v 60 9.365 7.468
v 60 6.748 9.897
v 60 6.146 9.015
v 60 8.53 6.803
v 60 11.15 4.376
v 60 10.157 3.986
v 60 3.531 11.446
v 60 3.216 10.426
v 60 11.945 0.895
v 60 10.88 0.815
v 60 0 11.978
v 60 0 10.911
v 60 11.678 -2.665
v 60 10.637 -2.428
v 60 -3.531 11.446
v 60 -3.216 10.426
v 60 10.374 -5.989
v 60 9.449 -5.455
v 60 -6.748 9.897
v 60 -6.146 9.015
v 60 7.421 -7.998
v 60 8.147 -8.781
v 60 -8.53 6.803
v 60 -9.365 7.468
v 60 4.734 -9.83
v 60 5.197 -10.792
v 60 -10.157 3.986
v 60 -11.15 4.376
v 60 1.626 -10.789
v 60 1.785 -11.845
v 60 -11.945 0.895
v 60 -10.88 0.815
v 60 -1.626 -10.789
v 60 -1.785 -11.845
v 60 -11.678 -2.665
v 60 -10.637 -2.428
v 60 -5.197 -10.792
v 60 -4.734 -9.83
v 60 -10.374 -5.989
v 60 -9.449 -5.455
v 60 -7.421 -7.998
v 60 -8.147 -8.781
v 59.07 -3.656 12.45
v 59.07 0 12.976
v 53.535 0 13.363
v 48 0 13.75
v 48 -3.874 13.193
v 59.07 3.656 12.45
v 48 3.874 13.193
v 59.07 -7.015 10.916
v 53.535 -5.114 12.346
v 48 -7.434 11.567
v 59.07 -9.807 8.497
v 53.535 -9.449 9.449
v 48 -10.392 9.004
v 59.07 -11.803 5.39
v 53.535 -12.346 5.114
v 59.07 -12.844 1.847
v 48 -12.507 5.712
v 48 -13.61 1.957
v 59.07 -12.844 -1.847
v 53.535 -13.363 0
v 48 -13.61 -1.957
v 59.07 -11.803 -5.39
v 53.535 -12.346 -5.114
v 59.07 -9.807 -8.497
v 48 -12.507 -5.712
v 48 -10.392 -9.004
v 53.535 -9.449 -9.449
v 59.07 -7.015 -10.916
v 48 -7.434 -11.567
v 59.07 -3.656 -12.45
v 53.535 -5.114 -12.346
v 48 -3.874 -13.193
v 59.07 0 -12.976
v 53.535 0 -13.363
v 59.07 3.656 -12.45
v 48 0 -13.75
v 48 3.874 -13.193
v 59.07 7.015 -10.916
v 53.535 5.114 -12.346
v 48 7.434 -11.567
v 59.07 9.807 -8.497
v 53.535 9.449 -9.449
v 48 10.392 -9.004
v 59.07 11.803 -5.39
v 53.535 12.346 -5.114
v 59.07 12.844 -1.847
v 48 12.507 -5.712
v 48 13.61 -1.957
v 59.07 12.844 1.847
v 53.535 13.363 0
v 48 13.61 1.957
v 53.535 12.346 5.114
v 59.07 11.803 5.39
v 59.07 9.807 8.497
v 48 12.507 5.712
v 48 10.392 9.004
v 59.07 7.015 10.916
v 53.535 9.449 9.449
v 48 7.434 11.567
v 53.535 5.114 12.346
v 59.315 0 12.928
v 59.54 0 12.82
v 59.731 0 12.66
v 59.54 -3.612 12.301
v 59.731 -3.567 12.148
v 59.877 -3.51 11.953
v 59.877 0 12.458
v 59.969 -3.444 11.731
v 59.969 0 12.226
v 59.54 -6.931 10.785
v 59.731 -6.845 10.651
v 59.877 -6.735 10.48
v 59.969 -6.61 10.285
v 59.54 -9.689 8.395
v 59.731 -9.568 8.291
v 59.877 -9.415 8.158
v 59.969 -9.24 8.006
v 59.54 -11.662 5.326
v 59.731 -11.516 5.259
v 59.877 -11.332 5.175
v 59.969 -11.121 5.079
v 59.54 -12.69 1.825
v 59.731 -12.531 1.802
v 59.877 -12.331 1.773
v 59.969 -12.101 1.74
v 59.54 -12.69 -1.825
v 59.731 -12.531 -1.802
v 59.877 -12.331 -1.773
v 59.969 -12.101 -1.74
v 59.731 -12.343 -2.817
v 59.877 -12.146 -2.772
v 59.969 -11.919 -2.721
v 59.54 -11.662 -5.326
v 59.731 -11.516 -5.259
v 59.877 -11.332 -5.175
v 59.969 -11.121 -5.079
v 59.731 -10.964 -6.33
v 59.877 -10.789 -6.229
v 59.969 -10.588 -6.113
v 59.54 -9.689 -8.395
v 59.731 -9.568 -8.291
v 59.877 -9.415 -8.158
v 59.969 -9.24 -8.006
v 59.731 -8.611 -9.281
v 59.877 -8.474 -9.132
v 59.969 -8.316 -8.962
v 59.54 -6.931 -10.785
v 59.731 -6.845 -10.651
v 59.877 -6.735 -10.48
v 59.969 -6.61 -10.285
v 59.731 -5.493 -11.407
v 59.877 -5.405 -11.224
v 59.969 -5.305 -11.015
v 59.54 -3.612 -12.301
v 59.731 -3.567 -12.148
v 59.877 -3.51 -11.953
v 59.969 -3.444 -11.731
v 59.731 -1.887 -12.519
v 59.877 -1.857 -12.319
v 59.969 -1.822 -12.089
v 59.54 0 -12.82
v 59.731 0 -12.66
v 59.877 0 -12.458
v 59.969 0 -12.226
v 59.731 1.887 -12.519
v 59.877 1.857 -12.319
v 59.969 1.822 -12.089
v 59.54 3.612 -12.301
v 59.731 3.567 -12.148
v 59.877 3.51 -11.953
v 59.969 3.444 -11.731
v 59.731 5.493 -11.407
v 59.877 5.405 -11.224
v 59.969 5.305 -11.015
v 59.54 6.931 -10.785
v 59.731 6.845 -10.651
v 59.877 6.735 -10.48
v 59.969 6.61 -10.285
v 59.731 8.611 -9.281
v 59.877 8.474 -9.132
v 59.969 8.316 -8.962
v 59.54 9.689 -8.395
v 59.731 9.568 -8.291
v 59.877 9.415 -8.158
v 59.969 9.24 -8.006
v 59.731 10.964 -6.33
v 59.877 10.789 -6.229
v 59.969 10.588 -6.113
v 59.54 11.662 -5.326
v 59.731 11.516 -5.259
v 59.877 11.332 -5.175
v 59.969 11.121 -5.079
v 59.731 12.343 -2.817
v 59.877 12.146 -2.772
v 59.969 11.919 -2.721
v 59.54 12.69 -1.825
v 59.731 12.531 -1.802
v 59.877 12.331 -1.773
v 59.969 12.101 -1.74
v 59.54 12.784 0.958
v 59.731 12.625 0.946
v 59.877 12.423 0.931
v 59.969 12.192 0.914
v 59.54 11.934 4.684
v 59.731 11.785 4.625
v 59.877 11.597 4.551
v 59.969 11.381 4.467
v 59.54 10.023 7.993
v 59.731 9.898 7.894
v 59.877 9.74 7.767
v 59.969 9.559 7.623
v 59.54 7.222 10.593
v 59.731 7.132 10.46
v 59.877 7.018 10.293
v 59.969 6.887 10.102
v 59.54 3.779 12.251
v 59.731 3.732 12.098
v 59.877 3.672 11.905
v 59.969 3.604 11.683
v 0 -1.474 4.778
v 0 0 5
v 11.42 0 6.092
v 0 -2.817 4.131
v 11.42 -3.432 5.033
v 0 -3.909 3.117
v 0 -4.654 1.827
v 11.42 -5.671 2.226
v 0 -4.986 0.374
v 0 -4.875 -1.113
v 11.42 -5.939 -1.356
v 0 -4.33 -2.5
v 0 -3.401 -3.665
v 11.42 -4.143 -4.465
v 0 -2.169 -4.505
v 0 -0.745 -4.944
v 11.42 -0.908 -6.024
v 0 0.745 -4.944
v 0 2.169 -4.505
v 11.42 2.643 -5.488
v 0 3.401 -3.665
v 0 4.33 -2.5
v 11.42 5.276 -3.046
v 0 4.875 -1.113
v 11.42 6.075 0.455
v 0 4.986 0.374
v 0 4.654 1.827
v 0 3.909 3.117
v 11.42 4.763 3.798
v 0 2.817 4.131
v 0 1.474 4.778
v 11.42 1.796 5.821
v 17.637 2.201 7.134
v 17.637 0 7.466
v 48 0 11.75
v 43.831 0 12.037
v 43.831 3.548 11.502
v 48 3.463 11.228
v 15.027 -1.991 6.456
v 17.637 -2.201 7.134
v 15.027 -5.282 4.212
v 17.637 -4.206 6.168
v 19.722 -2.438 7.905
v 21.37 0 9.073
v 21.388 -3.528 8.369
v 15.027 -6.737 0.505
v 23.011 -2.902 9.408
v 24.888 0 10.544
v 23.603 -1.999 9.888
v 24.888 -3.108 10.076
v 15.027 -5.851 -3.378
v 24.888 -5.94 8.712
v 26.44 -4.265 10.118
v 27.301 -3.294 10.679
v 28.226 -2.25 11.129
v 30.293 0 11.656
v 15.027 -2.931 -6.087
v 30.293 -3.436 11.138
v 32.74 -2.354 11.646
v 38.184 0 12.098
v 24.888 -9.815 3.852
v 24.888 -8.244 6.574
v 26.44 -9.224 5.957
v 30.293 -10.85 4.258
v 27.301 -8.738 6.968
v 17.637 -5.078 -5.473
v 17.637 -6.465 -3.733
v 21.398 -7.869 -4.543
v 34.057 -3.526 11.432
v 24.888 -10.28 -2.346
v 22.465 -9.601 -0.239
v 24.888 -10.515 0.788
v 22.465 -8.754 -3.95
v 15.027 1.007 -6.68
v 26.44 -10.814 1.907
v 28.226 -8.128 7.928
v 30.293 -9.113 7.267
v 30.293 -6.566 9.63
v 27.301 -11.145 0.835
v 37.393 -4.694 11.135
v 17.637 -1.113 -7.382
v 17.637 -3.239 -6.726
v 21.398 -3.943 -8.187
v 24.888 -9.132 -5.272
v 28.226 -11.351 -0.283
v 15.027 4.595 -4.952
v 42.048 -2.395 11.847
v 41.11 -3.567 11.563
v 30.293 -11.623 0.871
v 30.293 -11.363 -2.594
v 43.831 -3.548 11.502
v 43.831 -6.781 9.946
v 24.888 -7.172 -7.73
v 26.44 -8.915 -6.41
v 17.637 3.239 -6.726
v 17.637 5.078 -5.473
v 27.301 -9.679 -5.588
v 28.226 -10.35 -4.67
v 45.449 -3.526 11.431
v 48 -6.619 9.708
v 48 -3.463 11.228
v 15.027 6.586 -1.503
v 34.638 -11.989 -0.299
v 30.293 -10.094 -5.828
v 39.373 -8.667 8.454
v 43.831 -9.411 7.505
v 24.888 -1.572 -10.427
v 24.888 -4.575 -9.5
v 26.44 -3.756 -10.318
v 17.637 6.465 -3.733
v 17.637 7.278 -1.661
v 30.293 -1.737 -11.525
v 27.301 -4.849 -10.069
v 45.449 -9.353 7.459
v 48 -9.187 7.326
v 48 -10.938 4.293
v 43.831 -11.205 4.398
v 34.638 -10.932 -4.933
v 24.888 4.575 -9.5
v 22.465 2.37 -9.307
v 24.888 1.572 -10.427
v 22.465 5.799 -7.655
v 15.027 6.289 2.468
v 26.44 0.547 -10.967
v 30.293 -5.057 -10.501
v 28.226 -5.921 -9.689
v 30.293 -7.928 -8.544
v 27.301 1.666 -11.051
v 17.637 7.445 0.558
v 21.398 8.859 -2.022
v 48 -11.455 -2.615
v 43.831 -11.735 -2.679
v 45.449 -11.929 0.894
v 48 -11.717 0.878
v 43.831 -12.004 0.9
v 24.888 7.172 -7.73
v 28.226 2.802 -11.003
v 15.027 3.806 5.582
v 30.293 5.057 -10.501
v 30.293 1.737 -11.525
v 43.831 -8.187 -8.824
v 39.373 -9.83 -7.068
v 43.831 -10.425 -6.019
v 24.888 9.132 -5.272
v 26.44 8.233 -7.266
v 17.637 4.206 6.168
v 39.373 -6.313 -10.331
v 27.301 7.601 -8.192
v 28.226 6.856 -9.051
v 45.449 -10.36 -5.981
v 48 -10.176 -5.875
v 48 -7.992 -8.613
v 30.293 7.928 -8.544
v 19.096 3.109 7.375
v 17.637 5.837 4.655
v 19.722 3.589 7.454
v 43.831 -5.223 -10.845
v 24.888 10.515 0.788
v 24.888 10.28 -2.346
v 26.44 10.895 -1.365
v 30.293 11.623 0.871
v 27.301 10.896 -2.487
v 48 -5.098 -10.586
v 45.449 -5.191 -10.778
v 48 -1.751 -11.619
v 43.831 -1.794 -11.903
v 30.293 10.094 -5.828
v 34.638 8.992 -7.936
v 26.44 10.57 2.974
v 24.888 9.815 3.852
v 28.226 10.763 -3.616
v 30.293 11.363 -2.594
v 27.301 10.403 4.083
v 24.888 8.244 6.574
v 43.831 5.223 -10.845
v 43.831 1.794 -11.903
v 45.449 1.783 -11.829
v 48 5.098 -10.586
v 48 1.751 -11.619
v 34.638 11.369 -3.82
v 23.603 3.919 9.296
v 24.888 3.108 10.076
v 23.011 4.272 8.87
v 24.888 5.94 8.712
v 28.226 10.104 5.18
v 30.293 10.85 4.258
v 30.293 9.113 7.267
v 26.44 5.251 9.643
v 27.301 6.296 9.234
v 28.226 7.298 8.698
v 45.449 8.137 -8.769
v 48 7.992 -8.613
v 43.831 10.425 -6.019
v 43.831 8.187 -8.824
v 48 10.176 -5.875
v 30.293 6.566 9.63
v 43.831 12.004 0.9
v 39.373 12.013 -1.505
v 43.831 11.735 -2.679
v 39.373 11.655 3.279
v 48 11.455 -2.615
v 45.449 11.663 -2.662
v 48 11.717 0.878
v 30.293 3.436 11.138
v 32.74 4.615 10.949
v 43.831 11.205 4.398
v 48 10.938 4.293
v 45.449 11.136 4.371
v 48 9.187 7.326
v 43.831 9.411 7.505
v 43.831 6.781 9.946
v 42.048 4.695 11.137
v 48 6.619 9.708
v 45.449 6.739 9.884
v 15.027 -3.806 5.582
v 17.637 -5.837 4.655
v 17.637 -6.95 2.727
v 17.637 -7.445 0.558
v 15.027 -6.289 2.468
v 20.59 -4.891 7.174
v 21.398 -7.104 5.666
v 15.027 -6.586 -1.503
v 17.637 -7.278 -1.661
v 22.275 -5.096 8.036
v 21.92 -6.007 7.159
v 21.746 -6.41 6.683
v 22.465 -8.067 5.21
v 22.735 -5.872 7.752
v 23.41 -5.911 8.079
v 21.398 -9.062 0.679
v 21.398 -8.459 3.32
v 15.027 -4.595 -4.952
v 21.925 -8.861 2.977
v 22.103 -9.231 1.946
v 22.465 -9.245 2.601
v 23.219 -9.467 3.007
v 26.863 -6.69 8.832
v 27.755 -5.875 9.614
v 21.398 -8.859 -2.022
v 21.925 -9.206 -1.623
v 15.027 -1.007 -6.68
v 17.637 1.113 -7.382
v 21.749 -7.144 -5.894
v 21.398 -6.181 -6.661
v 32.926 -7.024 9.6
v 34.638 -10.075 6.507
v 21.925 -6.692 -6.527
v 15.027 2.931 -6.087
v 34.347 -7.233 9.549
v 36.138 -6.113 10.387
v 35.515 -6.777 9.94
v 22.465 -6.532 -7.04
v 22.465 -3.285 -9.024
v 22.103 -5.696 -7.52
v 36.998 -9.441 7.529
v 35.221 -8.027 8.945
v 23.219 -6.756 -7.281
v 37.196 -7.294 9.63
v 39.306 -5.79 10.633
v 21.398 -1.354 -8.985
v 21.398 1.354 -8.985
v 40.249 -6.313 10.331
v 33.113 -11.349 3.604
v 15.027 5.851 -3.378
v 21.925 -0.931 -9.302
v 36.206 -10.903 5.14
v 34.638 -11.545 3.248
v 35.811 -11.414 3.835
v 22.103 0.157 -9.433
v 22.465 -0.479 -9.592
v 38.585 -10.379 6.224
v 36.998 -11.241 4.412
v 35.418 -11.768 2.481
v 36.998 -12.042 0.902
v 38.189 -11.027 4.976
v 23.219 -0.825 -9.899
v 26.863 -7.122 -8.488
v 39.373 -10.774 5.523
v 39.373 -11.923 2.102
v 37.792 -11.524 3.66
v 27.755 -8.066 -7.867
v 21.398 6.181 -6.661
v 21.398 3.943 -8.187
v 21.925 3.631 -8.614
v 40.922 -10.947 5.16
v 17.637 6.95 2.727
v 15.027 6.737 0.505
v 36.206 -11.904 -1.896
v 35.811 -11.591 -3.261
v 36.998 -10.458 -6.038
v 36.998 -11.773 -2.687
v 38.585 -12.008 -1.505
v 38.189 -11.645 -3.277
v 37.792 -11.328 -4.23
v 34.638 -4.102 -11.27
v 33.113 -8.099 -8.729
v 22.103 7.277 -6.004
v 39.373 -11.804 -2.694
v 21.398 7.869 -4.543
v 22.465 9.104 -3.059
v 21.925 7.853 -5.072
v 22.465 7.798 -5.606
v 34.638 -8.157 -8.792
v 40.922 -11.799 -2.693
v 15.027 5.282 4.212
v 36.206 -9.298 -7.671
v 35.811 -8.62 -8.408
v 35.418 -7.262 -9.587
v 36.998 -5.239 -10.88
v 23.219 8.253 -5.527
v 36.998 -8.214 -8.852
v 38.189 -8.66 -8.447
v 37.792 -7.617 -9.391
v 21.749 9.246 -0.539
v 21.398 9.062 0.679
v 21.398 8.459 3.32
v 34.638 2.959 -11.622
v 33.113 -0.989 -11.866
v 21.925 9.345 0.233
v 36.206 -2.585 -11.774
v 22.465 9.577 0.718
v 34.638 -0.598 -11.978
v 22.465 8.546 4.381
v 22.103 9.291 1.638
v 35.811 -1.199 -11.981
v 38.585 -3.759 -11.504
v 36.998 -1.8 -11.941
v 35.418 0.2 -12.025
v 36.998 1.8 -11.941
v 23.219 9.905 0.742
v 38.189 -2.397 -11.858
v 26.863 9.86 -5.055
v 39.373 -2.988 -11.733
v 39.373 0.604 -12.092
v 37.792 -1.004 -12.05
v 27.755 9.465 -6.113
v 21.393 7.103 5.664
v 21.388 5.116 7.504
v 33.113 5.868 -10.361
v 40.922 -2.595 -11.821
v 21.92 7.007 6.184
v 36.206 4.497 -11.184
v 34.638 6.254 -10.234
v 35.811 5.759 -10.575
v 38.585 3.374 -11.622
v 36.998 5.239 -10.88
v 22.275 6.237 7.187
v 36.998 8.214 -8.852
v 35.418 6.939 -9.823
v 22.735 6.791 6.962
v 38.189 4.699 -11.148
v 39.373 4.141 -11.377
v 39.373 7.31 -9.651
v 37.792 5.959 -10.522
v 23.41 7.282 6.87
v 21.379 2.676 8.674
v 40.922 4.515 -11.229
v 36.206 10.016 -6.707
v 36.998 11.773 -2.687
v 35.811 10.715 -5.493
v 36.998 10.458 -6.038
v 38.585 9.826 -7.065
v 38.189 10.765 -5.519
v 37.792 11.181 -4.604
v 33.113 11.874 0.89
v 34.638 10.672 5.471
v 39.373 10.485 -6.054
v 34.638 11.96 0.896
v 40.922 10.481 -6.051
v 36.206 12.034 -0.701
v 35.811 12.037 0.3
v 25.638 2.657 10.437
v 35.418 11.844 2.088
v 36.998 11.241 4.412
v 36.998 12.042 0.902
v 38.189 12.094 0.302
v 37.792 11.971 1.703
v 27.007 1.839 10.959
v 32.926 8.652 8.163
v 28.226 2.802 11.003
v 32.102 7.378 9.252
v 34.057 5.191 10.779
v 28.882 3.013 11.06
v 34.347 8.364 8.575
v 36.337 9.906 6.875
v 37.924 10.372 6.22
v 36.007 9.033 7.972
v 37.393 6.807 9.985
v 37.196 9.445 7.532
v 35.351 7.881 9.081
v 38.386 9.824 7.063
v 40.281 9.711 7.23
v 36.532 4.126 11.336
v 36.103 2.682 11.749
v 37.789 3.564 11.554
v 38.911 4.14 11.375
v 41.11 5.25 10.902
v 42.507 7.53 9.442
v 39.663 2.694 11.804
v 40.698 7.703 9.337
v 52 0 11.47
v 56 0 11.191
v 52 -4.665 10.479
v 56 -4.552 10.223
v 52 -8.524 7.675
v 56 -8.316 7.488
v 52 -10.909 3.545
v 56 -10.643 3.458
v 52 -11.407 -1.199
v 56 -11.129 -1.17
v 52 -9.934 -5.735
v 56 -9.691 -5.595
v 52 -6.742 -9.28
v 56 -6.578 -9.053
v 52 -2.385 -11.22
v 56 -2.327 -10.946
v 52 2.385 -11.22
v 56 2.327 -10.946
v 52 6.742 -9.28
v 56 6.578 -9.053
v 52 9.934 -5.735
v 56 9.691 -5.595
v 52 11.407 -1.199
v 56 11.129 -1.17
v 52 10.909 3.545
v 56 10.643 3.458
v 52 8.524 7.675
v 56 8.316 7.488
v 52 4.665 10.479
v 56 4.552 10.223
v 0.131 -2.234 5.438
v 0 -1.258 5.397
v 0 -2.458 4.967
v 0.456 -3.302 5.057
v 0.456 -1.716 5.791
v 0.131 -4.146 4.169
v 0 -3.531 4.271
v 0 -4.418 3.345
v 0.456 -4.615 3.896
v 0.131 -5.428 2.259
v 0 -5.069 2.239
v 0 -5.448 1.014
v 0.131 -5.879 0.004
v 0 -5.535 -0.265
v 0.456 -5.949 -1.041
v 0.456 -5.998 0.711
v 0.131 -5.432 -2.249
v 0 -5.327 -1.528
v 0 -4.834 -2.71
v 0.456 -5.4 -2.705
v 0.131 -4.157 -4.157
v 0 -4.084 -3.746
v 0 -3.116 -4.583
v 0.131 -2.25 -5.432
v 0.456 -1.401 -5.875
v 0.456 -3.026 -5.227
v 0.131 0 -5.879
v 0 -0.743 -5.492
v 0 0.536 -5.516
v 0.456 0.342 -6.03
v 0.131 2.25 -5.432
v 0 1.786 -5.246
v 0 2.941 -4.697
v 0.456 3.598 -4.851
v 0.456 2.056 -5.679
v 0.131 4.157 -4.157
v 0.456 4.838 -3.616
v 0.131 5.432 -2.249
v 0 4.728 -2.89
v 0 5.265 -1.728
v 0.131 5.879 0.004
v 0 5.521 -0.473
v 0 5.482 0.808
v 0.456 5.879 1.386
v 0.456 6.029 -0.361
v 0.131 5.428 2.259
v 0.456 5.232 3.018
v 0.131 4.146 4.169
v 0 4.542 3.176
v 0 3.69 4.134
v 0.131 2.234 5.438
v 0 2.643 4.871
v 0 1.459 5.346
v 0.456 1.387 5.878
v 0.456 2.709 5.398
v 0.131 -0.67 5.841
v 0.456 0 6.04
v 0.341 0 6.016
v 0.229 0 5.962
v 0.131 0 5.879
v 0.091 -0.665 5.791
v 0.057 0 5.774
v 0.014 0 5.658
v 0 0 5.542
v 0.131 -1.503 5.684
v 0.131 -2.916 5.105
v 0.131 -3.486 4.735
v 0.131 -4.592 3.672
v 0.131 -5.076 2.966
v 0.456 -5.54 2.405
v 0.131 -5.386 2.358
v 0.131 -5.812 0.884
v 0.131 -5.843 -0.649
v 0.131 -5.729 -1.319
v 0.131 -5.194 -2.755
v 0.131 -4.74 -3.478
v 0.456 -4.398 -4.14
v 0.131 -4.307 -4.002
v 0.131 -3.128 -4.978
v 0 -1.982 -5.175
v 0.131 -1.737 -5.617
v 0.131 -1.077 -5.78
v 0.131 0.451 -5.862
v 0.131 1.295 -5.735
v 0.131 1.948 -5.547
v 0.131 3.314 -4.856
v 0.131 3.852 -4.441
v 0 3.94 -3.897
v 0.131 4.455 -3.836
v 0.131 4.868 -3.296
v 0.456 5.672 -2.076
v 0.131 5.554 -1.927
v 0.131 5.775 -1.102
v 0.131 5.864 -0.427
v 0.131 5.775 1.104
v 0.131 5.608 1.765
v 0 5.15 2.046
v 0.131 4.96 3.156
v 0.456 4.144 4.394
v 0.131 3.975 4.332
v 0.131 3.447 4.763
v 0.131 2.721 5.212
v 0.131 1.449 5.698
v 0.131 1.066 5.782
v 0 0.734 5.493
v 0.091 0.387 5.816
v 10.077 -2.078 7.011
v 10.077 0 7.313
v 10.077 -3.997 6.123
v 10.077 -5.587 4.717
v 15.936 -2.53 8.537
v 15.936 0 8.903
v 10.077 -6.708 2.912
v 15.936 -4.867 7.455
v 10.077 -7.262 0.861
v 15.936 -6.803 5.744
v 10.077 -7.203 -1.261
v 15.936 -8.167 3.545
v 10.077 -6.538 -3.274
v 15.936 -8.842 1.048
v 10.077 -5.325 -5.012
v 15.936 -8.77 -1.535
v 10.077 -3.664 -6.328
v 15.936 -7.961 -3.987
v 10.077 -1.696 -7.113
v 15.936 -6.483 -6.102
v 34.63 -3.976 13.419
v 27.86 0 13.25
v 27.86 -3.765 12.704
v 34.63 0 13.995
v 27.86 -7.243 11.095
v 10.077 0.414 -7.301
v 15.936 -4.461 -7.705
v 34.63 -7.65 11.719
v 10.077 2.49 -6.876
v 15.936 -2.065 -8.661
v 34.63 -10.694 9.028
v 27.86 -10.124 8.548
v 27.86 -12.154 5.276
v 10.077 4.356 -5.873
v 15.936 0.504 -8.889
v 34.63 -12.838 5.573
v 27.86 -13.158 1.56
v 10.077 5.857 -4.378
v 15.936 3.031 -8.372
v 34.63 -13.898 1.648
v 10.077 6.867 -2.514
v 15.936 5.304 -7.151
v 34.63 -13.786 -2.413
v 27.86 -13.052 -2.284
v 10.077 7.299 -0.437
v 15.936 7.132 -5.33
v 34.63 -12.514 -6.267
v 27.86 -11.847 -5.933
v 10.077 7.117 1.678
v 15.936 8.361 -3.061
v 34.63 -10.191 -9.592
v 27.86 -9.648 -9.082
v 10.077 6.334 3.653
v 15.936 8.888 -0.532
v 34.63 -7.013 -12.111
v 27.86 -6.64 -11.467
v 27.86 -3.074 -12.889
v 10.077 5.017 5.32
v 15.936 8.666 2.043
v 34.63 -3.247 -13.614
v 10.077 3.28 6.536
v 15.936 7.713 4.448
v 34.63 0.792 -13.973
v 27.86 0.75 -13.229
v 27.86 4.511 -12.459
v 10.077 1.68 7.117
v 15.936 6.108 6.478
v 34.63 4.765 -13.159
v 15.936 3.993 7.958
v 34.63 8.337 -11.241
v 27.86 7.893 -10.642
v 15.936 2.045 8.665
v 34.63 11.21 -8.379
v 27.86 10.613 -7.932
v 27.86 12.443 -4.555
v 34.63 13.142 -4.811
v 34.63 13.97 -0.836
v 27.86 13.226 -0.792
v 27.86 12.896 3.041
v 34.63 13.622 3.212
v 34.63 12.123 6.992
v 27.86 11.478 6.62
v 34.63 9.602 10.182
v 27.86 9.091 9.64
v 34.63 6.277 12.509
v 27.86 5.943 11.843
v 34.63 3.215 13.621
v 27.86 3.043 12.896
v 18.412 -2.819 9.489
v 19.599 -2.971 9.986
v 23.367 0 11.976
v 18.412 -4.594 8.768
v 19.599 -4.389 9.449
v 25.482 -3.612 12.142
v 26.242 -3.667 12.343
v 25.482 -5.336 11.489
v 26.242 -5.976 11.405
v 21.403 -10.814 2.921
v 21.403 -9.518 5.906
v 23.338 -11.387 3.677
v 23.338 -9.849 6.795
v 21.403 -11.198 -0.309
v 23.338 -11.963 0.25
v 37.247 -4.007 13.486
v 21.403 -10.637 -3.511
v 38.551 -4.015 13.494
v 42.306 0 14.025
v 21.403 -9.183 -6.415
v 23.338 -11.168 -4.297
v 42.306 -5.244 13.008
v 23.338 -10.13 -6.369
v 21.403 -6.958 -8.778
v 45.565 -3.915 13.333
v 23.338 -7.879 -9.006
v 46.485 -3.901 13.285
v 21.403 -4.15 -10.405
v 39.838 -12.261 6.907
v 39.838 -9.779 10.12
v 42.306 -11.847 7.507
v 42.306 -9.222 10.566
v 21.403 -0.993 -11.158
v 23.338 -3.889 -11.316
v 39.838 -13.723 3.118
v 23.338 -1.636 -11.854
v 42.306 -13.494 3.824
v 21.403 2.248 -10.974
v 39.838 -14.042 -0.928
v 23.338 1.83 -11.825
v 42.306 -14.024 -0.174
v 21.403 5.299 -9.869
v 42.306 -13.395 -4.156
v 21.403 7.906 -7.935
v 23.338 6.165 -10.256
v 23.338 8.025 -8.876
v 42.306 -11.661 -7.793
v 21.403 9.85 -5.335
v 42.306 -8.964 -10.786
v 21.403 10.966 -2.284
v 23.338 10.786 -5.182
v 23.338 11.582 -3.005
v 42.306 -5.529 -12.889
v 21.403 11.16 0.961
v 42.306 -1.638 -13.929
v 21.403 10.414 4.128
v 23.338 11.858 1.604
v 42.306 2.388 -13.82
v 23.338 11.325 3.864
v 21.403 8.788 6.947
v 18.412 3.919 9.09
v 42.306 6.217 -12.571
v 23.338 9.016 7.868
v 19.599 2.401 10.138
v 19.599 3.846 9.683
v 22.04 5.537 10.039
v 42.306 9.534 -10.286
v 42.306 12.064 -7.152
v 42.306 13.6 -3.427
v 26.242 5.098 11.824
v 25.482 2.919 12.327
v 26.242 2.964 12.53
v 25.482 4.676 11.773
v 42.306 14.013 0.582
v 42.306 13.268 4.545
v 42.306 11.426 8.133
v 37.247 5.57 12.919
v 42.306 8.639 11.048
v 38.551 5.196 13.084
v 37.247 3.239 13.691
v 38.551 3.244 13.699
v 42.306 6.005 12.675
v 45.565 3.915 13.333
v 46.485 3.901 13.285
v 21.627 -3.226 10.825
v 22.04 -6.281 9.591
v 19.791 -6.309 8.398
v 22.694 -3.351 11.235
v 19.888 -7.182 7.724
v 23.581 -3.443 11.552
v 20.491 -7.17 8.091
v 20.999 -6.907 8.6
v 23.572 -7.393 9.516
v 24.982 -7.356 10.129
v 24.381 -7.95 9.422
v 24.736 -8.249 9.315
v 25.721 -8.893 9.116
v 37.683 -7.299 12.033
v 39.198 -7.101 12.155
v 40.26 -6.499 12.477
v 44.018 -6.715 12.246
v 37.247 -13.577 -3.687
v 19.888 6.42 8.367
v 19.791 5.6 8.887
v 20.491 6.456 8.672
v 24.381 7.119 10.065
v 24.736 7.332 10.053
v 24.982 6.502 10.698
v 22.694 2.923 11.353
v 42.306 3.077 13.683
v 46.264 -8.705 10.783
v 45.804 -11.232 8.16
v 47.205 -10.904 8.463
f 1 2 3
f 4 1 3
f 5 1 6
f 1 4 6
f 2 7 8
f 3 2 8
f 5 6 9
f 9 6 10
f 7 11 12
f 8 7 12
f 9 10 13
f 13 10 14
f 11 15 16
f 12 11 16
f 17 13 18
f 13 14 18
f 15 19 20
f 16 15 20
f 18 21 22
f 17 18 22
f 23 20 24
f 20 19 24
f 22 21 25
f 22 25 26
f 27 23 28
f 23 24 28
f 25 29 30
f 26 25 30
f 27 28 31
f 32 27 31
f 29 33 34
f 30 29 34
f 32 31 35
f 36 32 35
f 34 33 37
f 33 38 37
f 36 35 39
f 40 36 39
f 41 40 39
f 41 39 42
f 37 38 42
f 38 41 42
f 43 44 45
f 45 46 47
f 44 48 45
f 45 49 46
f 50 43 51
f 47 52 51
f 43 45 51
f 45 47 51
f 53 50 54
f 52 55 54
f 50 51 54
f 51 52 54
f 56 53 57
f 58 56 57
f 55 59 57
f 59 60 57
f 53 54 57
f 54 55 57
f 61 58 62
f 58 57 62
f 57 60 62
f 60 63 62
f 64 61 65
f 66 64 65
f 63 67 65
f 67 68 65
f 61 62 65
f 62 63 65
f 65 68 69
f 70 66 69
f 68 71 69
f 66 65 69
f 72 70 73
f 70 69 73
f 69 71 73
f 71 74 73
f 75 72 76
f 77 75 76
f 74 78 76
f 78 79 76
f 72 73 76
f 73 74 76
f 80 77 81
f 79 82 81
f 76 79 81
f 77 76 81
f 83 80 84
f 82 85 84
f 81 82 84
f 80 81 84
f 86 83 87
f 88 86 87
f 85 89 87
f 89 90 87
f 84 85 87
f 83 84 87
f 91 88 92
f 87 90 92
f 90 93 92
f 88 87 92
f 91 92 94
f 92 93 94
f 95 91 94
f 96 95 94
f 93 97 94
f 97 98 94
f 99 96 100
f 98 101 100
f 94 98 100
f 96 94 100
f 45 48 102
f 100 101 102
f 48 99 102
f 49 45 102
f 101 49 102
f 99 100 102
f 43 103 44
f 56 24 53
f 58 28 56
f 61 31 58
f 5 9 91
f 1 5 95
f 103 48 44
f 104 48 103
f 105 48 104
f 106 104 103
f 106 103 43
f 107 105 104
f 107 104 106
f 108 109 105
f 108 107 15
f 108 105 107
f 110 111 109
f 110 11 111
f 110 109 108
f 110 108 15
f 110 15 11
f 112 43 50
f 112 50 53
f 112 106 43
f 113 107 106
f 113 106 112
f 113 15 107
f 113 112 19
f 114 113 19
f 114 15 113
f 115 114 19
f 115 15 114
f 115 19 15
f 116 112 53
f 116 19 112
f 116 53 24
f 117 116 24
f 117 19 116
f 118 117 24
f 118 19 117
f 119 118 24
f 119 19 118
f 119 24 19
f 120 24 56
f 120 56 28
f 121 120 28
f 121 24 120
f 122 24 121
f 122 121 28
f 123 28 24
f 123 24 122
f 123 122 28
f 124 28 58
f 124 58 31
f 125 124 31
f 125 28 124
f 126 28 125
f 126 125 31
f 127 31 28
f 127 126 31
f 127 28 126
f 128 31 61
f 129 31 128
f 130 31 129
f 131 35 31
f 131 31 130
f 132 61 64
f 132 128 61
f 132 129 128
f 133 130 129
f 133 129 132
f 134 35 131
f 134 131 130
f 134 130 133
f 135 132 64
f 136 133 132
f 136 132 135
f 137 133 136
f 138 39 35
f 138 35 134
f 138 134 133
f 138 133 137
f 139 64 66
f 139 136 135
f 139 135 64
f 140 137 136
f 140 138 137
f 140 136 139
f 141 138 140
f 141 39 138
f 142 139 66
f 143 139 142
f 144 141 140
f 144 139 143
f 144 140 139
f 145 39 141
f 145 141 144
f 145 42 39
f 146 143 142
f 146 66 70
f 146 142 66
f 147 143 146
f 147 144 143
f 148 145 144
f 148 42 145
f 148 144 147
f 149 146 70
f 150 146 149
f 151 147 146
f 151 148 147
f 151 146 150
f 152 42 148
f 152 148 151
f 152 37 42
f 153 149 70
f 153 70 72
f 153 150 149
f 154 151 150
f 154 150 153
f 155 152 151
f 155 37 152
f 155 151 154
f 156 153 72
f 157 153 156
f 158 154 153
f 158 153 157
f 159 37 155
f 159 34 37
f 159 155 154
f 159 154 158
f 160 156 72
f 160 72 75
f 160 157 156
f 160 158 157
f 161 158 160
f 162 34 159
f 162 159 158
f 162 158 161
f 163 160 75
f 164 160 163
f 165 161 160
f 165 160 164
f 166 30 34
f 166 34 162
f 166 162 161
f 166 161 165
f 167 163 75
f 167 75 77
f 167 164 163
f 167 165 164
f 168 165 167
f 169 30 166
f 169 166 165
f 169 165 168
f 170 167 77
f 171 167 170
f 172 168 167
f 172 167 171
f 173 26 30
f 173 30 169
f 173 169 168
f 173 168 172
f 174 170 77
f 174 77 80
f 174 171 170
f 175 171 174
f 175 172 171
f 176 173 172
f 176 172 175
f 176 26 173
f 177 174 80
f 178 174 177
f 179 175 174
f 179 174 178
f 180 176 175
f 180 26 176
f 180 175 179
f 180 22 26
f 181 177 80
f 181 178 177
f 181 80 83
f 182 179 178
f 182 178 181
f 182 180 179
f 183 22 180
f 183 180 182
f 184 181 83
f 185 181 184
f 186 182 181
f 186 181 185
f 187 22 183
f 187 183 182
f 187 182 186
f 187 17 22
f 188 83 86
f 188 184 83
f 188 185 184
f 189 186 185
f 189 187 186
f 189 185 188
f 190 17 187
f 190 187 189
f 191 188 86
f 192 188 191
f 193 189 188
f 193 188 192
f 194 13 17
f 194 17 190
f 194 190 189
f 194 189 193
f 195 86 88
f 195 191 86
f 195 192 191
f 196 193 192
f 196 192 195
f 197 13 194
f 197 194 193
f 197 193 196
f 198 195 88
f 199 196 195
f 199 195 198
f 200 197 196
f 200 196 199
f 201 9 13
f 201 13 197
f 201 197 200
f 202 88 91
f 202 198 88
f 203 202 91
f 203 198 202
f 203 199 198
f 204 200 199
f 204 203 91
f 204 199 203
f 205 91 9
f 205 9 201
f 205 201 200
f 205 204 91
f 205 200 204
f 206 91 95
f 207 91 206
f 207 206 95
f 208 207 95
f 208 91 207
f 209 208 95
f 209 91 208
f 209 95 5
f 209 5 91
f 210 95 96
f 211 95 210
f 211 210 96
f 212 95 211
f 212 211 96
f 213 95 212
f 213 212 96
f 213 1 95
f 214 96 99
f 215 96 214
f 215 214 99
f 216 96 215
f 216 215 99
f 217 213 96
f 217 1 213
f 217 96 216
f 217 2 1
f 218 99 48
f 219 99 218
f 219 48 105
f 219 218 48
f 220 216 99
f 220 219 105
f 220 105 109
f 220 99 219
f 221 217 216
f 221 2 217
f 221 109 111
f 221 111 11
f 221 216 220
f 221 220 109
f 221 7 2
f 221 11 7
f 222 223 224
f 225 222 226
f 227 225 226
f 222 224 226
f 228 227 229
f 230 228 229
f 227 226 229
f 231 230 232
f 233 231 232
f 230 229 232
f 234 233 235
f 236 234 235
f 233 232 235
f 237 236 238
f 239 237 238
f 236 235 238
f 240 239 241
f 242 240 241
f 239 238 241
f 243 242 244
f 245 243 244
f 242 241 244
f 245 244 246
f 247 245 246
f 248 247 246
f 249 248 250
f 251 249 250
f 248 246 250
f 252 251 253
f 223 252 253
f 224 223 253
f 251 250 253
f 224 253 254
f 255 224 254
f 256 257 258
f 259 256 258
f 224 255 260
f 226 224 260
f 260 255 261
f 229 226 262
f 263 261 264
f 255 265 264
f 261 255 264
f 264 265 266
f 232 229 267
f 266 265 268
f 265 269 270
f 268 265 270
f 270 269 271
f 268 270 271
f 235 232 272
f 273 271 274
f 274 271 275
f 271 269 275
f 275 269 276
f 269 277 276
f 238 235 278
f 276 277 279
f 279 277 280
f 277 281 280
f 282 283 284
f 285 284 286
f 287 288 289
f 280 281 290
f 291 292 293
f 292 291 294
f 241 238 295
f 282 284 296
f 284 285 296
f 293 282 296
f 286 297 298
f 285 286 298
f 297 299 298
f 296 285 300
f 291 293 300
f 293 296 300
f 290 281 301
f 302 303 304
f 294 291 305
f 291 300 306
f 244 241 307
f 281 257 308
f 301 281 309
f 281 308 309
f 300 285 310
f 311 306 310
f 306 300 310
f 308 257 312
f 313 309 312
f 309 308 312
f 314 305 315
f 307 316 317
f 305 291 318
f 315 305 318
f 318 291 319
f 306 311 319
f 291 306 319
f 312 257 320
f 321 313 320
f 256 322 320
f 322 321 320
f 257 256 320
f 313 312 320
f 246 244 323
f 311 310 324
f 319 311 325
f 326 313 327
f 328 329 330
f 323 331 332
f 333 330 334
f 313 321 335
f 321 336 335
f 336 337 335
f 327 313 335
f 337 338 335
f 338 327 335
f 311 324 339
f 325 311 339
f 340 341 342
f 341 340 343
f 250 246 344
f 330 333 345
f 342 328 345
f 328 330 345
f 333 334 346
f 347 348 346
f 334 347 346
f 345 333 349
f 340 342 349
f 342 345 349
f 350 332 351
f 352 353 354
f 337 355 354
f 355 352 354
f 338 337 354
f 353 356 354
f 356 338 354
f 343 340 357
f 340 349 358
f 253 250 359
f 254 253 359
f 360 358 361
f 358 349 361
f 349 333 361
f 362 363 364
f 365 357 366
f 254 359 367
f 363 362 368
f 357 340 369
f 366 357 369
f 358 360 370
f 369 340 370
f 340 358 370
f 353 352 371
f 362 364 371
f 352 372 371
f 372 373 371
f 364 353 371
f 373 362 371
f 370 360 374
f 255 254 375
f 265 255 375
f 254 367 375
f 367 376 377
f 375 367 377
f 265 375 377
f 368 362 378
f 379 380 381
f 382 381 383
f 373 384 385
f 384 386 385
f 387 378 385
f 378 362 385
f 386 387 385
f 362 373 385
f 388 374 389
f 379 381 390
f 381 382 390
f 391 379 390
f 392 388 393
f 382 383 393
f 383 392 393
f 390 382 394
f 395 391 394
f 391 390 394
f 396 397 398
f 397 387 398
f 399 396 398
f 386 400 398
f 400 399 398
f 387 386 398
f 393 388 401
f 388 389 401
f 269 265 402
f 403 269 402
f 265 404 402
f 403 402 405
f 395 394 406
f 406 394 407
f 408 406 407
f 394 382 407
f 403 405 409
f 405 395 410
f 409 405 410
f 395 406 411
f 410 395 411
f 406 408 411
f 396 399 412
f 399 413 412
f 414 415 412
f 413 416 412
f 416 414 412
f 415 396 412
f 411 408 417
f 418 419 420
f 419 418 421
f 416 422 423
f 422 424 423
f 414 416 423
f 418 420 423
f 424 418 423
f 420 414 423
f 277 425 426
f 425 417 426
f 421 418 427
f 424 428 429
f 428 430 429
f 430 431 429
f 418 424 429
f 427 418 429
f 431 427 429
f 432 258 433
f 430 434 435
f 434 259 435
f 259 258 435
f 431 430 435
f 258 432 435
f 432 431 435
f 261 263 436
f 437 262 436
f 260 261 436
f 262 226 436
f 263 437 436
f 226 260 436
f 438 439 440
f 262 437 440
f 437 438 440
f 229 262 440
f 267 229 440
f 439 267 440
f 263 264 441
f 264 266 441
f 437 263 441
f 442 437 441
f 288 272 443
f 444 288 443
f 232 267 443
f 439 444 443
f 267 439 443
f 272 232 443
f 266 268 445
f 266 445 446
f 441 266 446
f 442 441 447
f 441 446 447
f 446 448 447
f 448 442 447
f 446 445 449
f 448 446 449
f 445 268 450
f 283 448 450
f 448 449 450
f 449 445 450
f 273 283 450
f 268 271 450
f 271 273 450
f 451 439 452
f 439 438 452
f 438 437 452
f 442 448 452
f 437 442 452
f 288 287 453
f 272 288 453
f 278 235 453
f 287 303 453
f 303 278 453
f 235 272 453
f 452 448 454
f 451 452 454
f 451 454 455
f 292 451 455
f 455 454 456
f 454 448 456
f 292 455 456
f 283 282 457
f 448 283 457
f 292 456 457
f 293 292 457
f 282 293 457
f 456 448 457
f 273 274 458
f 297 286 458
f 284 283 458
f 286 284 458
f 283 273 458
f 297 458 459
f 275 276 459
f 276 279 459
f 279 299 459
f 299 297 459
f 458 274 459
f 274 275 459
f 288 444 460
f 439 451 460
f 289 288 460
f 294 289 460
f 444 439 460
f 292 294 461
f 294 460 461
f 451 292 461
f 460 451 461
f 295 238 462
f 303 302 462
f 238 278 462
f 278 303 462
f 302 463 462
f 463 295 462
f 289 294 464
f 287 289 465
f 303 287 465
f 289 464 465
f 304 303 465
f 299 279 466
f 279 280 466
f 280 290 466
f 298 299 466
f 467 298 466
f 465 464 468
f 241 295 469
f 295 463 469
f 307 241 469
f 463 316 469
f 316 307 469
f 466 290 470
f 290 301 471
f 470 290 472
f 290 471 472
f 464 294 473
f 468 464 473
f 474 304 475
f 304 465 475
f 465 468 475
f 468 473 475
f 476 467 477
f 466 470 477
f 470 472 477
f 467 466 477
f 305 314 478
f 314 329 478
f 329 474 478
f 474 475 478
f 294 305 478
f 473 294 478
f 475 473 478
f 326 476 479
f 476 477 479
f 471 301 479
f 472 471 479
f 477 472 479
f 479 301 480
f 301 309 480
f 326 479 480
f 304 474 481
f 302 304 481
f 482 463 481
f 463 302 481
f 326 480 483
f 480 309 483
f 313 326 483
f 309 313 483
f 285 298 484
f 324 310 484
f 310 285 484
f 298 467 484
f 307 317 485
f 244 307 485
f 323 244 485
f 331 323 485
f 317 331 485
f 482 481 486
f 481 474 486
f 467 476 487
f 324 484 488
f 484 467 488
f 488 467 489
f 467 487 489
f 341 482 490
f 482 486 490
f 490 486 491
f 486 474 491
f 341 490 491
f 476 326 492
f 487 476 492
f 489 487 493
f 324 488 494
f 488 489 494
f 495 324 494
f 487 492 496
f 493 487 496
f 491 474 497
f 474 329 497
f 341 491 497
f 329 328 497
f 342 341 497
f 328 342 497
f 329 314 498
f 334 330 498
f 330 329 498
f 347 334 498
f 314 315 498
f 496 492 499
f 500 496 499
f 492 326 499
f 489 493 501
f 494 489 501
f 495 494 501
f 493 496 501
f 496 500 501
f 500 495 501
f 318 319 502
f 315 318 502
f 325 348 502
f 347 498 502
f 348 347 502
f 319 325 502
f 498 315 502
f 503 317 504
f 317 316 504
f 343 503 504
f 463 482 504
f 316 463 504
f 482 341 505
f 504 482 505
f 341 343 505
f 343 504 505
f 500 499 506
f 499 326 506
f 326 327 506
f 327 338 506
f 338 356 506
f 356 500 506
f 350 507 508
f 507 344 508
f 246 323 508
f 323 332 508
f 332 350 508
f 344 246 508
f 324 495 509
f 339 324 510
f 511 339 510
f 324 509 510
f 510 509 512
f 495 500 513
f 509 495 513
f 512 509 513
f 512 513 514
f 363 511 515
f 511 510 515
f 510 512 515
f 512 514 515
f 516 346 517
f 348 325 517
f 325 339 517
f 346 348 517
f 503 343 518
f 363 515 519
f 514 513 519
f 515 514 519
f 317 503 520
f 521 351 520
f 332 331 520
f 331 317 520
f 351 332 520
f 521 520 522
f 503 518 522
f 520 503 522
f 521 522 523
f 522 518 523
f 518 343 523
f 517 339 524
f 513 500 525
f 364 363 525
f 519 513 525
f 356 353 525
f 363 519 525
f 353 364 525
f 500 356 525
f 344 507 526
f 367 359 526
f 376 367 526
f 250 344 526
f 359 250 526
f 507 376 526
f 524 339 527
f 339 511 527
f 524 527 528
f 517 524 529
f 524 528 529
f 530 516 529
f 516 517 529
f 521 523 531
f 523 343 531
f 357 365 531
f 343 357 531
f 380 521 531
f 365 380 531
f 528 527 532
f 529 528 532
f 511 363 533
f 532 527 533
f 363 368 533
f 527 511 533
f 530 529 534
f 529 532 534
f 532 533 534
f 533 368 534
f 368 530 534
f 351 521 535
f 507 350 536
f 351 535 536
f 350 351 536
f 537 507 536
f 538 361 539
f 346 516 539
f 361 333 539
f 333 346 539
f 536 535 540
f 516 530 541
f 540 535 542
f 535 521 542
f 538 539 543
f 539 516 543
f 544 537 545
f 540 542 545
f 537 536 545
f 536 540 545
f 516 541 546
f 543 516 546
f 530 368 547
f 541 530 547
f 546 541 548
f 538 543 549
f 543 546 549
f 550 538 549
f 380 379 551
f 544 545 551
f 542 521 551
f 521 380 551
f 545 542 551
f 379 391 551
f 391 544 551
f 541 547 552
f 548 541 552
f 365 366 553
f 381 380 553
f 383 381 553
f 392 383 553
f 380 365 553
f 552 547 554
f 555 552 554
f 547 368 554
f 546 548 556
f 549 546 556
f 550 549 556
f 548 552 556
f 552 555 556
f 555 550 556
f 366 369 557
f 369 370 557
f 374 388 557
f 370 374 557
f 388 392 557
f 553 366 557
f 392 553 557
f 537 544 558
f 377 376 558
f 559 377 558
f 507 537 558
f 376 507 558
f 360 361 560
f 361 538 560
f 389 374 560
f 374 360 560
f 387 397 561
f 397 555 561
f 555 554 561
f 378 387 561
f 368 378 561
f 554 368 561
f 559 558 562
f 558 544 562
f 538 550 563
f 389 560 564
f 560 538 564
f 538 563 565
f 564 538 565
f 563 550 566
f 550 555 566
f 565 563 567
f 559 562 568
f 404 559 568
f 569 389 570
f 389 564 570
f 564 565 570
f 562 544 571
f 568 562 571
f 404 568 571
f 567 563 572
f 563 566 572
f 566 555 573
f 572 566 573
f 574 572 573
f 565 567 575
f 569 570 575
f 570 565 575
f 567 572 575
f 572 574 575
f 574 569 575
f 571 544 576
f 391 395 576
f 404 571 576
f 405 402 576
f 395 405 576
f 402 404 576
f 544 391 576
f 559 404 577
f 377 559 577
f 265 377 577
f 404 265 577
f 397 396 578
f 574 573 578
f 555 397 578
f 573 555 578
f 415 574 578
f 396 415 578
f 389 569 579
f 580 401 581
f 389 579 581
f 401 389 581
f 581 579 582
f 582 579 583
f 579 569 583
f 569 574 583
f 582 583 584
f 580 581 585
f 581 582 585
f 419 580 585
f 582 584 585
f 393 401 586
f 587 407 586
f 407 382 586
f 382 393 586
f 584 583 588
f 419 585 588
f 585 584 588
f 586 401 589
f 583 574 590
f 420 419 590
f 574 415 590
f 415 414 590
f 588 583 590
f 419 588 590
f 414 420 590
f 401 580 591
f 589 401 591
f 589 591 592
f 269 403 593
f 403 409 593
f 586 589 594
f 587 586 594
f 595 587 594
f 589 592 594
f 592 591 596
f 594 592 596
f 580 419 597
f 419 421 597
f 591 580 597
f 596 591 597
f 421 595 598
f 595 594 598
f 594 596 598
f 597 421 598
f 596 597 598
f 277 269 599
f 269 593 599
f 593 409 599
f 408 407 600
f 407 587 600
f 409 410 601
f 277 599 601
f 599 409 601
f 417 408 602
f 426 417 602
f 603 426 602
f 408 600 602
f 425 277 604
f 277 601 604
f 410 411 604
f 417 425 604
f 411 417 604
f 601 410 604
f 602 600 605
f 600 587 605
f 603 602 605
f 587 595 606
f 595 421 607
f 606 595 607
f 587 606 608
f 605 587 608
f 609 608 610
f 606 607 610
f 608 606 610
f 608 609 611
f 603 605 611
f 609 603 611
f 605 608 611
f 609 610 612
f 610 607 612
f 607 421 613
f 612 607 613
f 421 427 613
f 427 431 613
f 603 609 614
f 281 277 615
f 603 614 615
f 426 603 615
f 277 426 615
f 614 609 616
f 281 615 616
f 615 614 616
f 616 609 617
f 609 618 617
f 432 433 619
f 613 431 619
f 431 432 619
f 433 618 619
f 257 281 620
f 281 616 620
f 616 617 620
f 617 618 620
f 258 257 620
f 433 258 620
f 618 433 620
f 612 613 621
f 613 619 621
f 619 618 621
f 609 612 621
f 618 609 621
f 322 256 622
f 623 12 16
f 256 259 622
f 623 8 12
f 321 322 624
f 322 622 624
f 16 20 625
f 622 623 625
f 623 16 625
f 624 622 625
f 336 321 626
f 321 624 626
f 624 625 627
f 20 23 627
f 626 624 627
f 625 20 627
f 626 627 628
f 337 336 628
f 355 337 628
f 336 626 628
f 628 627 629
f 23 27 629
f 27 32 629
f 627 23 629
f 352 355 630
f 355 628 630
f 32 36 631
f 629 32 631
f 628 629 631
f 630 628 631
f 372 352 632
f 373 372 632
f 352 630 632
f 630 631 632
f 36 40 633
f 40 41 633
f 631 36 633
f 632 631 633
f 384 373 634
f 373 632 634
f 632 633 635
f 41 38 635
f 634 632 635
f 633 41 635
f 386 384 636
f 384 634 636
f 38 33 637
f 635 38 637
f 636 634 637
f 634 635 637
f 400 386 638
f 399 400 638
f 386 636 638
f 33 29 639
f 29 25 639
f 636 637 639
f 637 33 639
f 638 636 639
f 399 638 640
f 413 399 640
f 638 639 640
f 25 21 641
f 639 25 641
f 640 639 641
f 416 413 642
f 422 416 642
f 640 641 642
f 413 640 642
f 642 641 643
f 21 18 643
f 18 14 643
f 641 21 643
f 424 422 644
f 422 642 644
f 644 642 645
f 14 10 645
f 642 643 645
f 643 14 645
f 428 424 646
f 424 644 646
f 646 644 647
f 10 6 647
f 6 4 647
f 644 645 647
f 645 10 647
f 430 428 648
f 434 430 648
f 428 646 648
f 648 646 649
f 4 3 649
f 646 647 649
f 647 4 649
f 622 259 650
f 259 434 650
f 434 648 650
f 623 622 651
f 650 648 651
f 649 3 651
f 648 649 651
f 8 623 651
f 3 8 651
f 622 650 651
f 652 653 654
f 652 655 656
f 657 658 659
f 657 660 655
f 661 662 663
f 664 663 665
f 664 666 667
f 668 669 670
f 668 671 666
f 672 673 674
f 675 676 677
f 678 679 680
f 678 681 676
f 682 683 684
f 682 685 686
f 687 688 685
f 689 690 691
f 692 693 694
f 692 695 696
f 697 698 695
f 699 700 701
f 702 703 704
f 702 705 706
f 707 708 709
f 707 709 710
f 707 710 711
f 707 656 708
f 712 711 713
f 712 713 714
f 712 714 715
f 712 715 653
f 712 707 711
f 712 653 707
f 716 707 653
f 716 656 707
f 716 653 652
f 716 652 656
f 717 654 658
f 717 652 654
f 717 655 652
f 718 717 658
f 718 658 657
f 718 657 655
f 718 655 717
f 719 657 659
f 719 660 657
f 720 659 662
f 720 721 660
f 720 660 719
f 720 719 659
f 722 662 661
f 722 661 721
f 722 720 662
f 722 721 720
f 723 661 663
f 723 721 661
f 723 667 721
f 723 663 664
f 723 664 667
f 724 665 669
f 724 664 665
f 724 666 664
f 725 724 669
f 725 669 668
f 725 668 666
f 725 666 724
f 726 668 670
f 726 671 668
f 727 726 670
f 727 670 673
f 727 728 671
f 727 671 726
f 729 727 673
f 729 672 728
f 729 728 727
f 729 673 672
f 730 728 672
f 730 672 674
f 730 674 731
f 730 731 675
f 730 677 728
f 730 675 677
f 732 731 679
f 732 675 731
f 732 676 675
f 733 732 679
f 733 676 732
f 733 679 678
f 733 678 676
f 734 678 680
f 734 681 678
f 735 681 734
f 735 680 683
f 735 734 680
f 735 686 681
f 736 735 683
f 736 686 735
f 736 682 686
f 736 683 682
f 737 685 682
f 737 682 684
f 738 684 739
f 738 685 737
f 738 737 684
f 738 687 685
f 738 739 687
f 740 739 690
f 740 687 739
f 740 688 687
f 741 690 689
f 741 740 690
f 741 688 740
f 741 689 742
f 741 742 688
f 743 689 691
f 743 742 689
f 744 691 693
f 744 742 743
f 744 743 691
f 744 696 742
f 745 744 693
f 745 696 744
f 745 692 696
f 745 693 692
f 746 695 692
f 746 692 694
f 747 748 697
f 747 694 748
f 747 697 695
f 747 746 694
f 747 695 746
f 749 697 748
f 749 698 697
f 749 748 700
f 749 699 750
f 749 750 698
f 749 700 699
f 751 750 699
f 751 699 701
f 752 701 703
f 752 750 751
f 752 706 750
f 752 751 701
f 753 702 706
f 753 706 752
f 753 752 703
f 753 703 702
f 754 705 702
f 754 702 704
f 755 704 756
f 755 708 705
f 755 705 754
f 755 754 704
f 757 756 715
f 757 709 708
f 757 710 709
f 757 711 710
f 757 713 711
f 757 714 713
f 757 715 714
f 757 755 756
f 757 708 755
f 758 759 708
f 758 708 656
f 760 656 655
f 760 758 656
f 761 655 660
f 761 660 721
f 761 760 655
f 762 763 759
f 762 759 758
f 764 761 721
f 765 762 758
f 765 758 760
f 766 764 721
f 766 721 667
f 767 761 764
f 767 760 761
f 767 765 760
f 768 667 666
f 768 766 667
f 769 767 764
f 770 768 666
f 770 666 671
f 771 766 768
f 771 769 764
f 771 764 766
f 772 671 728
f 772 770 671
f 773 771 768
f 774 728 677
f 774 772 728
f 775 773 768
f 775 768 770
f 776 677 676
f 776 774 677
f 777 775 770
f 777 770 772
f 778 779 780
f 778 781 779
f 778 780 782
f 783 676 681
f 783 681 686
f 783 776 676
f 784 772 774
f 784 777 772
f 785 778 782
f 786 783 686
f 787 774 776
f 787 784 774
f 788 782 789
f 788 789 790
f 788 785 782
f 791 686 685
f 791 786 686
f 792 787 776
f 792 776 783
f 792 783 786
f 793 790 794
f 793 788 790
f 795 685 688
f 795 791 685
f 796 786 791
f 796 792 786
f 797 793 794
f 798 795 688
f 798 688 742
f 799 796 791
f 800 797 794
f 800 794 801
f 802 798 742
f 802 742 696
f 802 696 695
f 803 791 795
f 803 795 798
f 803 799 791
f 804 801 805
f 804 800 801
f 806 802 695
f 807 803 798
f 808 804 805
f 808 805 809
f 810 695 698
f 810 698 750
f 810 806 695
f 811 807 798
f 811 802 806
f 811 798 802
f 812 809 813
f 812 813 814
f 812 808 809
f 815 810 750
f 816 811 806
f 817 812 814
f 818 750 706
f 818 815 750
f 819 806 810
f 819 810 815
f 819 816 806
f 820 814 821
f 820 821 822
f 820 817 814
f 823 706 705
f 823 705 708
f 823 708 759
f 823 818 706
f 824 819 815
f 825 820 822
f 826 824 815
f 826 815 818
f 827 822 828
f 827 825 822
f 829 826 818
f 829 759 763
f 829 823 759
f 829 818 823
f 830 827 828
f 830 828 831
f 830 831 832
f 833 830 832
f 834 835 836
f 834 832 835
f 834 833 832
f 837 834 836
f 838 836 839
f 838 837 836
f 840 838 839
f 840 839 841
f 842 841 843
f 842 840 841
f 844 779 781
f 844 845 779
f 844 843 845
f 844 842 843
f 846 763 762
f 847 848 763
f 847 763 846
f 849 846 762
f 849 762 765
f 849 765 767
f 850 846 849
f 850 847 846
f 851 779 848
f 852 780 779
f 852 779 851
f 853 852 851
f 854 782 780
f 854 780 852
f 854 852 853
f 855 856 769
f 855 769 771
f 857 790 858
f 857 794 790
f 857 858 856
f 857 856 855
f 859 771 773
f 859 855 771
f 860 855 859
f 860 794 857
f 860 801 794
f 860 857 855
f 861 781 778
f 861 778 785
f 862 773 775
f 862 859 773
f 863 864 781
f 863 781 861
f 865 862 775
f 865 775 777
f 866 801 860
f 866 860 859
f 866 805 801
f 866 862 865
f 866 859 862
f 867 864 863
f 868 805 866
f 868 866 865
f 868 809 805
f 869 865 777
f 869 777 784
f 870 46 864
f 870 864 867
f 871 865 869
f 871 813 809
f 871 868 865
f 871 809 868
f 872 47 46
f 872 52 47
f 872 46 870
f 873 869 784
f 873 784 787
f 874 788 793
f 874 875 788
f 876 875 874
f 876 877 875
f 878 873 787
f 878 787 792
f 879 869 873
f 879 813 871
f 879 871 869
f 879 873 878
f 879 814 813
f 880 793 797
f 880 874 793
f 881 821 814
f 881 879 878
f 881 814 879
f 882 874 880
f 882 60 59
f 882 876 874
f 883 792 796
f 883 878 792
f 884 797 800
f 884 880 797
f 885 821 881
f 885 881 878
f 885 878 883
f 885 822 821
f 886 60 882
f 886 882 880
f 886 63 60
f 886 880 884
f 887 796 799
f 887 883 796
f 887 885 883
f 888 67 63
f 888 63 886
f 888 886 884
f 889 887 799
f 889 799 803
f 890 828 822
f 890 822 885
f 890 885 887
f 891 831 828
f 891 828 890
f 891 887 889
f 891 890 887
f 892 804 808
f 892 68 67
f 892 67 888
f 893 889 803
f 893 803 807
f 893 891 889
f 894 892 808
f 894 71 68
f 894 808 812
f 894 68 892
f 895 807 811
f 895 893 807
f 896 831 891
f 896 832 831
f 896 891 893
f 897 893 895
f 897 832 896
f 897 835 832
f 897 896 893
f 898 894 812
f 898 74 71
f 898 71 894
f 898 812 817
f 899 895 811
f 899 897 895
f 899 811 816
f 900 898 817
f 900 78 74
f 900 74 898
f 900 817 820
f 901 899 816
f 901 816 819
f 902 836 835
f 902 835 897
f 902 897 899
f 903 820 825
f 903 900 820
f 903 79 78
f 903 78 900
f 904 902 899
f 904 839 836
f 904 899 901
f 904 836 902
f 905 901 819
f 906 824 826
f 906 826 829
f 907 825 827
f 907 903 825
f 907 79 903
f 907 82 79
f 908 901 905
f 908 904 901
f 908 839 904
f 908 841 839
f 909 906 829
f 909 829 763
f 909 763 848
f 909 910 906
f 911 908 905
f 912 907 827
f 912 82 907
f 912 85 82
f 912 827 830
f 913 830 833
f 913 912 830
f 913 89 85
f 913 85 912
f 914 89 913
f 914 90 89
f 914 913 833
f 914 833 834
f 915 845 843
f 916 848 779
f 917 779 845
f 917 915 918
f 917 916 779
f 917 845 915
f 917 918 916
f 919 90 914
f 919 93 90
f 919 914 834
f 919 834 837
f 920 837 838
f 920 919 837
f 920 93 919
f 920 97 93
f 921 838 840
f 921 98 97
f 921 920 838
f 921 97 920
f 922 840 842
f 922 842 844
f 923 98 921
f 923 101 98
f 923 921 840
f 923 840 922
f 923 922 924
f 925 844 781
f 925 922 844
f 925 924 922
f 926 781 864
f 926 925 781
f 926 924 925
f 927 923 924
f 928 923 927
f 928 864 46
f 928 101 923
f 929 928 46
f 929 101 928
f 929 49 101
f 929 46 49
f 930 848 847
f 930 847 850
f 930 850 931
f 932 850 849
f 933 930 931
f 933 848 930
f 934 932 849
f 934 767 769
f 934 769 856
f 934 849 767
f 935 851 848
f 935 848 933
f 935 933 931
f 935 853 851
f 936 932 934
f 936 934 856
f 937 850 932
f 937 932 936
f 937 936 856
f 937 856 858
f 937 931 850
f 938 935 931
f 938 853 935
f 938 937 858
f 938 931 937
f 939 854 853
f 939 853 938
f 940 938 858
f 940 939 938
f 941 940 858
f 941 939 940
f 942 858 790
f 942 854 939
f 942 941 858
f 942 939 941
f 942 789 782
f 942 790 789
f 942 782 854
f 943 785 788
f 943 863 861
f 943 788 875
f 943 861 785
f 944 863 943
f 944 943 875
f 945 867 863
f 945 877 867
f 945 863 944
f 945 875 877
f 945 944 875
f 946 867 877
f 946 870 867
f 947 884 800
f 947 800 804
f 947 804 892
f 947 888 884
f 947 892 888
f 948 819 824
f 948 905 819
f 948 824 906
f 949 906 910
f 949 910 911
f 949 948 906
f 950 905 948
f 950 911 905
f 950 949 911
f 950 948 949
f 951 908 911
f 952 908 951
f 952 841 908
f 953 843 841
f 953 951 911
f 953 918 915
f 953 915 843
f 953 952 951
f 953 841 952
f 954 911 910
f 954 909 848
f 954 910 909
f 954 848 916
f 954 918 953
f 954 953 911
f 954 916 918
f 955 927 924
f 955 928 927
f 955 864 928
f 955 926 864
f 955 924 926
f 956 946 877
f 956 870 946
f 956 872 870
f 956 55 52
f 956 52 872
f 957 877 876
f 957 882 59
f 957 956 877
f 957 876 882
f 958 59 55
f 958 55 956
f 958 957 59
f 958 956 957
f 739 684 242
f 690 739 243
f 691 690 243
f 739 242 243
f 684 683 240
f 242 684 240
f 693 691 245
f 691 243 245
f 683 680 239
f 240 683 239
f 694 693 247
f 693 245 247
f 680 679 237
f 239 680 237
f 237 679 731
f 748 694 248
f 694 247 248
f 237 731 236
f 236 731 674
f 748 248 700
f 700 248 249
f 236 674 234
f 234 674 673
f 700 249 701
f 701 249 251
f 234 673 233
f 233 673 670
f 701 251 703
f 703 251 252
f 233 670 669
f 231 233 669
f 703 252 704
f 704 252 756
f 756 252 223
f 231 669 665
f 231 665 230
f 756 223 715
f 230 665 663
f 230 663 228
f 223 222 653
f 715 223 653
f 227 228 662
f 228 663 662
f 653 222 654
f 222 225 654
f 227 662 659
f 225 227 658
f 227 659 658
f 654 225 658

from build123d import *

# Parameters (mm, degrees)
F2_R = 1
F3_R = 0.5


with BuildPart() as f1:
    # F0 (on Front) → F1 (revolve)
    with BuildSketch(Plane.XZ):
        with BuildLine():
            Line((60, 12.9108782567), (48, 13.75))
            add(Edge.make_bspline(
                [(0, 6), (11.4919004803, 6.9856289308), (18.0424222366, 9.631529618), (29.0806898355, 14.7666881692), (44.6449176536, 13.9846102123), (48, 13.75)],
                knots=[0, 0, 0, 0, 0.3674335032, 0.6472361068, 1, 1, 1, 1], degree=3))
            Line((0, 6), (0, 5))
            add(Edge.make_bspline(
                [(0, 5), (16.6661370682, 5.9941056502), (20.2456012863, 9.0717837053), (29.9782875352, 12.4044792441), (44.6379494506, 12.1710072082), (48, 11.75)],
                knots=[0, 0, 0, 0, 0.4001131959, 0.647153019, 1, 1, 1, 1], degree=3))
            Line((48, 11.75), (60, 10.9108782567))
            Line((60, 10.9108782567), (60, 12.9108782567))
        make_face()
    revolve(axis=Axis((24.9500407372, 0, 0), (1, 0, 0)))

    # F2
    f2_edges = [f1.edges().sort_by_distance(p)[0] for p in [
        (60, 0, -12.910878),
    ]]
    fillet(f2_edges, radius=F2_R)

    # F3
    f3_edges = [f1.edges().sort_by_distance(p)[0] for p in [
        (0, 0, -6),
    ]]
    fillet(f3_edges, radius=F3_R)


solid = f1.part
